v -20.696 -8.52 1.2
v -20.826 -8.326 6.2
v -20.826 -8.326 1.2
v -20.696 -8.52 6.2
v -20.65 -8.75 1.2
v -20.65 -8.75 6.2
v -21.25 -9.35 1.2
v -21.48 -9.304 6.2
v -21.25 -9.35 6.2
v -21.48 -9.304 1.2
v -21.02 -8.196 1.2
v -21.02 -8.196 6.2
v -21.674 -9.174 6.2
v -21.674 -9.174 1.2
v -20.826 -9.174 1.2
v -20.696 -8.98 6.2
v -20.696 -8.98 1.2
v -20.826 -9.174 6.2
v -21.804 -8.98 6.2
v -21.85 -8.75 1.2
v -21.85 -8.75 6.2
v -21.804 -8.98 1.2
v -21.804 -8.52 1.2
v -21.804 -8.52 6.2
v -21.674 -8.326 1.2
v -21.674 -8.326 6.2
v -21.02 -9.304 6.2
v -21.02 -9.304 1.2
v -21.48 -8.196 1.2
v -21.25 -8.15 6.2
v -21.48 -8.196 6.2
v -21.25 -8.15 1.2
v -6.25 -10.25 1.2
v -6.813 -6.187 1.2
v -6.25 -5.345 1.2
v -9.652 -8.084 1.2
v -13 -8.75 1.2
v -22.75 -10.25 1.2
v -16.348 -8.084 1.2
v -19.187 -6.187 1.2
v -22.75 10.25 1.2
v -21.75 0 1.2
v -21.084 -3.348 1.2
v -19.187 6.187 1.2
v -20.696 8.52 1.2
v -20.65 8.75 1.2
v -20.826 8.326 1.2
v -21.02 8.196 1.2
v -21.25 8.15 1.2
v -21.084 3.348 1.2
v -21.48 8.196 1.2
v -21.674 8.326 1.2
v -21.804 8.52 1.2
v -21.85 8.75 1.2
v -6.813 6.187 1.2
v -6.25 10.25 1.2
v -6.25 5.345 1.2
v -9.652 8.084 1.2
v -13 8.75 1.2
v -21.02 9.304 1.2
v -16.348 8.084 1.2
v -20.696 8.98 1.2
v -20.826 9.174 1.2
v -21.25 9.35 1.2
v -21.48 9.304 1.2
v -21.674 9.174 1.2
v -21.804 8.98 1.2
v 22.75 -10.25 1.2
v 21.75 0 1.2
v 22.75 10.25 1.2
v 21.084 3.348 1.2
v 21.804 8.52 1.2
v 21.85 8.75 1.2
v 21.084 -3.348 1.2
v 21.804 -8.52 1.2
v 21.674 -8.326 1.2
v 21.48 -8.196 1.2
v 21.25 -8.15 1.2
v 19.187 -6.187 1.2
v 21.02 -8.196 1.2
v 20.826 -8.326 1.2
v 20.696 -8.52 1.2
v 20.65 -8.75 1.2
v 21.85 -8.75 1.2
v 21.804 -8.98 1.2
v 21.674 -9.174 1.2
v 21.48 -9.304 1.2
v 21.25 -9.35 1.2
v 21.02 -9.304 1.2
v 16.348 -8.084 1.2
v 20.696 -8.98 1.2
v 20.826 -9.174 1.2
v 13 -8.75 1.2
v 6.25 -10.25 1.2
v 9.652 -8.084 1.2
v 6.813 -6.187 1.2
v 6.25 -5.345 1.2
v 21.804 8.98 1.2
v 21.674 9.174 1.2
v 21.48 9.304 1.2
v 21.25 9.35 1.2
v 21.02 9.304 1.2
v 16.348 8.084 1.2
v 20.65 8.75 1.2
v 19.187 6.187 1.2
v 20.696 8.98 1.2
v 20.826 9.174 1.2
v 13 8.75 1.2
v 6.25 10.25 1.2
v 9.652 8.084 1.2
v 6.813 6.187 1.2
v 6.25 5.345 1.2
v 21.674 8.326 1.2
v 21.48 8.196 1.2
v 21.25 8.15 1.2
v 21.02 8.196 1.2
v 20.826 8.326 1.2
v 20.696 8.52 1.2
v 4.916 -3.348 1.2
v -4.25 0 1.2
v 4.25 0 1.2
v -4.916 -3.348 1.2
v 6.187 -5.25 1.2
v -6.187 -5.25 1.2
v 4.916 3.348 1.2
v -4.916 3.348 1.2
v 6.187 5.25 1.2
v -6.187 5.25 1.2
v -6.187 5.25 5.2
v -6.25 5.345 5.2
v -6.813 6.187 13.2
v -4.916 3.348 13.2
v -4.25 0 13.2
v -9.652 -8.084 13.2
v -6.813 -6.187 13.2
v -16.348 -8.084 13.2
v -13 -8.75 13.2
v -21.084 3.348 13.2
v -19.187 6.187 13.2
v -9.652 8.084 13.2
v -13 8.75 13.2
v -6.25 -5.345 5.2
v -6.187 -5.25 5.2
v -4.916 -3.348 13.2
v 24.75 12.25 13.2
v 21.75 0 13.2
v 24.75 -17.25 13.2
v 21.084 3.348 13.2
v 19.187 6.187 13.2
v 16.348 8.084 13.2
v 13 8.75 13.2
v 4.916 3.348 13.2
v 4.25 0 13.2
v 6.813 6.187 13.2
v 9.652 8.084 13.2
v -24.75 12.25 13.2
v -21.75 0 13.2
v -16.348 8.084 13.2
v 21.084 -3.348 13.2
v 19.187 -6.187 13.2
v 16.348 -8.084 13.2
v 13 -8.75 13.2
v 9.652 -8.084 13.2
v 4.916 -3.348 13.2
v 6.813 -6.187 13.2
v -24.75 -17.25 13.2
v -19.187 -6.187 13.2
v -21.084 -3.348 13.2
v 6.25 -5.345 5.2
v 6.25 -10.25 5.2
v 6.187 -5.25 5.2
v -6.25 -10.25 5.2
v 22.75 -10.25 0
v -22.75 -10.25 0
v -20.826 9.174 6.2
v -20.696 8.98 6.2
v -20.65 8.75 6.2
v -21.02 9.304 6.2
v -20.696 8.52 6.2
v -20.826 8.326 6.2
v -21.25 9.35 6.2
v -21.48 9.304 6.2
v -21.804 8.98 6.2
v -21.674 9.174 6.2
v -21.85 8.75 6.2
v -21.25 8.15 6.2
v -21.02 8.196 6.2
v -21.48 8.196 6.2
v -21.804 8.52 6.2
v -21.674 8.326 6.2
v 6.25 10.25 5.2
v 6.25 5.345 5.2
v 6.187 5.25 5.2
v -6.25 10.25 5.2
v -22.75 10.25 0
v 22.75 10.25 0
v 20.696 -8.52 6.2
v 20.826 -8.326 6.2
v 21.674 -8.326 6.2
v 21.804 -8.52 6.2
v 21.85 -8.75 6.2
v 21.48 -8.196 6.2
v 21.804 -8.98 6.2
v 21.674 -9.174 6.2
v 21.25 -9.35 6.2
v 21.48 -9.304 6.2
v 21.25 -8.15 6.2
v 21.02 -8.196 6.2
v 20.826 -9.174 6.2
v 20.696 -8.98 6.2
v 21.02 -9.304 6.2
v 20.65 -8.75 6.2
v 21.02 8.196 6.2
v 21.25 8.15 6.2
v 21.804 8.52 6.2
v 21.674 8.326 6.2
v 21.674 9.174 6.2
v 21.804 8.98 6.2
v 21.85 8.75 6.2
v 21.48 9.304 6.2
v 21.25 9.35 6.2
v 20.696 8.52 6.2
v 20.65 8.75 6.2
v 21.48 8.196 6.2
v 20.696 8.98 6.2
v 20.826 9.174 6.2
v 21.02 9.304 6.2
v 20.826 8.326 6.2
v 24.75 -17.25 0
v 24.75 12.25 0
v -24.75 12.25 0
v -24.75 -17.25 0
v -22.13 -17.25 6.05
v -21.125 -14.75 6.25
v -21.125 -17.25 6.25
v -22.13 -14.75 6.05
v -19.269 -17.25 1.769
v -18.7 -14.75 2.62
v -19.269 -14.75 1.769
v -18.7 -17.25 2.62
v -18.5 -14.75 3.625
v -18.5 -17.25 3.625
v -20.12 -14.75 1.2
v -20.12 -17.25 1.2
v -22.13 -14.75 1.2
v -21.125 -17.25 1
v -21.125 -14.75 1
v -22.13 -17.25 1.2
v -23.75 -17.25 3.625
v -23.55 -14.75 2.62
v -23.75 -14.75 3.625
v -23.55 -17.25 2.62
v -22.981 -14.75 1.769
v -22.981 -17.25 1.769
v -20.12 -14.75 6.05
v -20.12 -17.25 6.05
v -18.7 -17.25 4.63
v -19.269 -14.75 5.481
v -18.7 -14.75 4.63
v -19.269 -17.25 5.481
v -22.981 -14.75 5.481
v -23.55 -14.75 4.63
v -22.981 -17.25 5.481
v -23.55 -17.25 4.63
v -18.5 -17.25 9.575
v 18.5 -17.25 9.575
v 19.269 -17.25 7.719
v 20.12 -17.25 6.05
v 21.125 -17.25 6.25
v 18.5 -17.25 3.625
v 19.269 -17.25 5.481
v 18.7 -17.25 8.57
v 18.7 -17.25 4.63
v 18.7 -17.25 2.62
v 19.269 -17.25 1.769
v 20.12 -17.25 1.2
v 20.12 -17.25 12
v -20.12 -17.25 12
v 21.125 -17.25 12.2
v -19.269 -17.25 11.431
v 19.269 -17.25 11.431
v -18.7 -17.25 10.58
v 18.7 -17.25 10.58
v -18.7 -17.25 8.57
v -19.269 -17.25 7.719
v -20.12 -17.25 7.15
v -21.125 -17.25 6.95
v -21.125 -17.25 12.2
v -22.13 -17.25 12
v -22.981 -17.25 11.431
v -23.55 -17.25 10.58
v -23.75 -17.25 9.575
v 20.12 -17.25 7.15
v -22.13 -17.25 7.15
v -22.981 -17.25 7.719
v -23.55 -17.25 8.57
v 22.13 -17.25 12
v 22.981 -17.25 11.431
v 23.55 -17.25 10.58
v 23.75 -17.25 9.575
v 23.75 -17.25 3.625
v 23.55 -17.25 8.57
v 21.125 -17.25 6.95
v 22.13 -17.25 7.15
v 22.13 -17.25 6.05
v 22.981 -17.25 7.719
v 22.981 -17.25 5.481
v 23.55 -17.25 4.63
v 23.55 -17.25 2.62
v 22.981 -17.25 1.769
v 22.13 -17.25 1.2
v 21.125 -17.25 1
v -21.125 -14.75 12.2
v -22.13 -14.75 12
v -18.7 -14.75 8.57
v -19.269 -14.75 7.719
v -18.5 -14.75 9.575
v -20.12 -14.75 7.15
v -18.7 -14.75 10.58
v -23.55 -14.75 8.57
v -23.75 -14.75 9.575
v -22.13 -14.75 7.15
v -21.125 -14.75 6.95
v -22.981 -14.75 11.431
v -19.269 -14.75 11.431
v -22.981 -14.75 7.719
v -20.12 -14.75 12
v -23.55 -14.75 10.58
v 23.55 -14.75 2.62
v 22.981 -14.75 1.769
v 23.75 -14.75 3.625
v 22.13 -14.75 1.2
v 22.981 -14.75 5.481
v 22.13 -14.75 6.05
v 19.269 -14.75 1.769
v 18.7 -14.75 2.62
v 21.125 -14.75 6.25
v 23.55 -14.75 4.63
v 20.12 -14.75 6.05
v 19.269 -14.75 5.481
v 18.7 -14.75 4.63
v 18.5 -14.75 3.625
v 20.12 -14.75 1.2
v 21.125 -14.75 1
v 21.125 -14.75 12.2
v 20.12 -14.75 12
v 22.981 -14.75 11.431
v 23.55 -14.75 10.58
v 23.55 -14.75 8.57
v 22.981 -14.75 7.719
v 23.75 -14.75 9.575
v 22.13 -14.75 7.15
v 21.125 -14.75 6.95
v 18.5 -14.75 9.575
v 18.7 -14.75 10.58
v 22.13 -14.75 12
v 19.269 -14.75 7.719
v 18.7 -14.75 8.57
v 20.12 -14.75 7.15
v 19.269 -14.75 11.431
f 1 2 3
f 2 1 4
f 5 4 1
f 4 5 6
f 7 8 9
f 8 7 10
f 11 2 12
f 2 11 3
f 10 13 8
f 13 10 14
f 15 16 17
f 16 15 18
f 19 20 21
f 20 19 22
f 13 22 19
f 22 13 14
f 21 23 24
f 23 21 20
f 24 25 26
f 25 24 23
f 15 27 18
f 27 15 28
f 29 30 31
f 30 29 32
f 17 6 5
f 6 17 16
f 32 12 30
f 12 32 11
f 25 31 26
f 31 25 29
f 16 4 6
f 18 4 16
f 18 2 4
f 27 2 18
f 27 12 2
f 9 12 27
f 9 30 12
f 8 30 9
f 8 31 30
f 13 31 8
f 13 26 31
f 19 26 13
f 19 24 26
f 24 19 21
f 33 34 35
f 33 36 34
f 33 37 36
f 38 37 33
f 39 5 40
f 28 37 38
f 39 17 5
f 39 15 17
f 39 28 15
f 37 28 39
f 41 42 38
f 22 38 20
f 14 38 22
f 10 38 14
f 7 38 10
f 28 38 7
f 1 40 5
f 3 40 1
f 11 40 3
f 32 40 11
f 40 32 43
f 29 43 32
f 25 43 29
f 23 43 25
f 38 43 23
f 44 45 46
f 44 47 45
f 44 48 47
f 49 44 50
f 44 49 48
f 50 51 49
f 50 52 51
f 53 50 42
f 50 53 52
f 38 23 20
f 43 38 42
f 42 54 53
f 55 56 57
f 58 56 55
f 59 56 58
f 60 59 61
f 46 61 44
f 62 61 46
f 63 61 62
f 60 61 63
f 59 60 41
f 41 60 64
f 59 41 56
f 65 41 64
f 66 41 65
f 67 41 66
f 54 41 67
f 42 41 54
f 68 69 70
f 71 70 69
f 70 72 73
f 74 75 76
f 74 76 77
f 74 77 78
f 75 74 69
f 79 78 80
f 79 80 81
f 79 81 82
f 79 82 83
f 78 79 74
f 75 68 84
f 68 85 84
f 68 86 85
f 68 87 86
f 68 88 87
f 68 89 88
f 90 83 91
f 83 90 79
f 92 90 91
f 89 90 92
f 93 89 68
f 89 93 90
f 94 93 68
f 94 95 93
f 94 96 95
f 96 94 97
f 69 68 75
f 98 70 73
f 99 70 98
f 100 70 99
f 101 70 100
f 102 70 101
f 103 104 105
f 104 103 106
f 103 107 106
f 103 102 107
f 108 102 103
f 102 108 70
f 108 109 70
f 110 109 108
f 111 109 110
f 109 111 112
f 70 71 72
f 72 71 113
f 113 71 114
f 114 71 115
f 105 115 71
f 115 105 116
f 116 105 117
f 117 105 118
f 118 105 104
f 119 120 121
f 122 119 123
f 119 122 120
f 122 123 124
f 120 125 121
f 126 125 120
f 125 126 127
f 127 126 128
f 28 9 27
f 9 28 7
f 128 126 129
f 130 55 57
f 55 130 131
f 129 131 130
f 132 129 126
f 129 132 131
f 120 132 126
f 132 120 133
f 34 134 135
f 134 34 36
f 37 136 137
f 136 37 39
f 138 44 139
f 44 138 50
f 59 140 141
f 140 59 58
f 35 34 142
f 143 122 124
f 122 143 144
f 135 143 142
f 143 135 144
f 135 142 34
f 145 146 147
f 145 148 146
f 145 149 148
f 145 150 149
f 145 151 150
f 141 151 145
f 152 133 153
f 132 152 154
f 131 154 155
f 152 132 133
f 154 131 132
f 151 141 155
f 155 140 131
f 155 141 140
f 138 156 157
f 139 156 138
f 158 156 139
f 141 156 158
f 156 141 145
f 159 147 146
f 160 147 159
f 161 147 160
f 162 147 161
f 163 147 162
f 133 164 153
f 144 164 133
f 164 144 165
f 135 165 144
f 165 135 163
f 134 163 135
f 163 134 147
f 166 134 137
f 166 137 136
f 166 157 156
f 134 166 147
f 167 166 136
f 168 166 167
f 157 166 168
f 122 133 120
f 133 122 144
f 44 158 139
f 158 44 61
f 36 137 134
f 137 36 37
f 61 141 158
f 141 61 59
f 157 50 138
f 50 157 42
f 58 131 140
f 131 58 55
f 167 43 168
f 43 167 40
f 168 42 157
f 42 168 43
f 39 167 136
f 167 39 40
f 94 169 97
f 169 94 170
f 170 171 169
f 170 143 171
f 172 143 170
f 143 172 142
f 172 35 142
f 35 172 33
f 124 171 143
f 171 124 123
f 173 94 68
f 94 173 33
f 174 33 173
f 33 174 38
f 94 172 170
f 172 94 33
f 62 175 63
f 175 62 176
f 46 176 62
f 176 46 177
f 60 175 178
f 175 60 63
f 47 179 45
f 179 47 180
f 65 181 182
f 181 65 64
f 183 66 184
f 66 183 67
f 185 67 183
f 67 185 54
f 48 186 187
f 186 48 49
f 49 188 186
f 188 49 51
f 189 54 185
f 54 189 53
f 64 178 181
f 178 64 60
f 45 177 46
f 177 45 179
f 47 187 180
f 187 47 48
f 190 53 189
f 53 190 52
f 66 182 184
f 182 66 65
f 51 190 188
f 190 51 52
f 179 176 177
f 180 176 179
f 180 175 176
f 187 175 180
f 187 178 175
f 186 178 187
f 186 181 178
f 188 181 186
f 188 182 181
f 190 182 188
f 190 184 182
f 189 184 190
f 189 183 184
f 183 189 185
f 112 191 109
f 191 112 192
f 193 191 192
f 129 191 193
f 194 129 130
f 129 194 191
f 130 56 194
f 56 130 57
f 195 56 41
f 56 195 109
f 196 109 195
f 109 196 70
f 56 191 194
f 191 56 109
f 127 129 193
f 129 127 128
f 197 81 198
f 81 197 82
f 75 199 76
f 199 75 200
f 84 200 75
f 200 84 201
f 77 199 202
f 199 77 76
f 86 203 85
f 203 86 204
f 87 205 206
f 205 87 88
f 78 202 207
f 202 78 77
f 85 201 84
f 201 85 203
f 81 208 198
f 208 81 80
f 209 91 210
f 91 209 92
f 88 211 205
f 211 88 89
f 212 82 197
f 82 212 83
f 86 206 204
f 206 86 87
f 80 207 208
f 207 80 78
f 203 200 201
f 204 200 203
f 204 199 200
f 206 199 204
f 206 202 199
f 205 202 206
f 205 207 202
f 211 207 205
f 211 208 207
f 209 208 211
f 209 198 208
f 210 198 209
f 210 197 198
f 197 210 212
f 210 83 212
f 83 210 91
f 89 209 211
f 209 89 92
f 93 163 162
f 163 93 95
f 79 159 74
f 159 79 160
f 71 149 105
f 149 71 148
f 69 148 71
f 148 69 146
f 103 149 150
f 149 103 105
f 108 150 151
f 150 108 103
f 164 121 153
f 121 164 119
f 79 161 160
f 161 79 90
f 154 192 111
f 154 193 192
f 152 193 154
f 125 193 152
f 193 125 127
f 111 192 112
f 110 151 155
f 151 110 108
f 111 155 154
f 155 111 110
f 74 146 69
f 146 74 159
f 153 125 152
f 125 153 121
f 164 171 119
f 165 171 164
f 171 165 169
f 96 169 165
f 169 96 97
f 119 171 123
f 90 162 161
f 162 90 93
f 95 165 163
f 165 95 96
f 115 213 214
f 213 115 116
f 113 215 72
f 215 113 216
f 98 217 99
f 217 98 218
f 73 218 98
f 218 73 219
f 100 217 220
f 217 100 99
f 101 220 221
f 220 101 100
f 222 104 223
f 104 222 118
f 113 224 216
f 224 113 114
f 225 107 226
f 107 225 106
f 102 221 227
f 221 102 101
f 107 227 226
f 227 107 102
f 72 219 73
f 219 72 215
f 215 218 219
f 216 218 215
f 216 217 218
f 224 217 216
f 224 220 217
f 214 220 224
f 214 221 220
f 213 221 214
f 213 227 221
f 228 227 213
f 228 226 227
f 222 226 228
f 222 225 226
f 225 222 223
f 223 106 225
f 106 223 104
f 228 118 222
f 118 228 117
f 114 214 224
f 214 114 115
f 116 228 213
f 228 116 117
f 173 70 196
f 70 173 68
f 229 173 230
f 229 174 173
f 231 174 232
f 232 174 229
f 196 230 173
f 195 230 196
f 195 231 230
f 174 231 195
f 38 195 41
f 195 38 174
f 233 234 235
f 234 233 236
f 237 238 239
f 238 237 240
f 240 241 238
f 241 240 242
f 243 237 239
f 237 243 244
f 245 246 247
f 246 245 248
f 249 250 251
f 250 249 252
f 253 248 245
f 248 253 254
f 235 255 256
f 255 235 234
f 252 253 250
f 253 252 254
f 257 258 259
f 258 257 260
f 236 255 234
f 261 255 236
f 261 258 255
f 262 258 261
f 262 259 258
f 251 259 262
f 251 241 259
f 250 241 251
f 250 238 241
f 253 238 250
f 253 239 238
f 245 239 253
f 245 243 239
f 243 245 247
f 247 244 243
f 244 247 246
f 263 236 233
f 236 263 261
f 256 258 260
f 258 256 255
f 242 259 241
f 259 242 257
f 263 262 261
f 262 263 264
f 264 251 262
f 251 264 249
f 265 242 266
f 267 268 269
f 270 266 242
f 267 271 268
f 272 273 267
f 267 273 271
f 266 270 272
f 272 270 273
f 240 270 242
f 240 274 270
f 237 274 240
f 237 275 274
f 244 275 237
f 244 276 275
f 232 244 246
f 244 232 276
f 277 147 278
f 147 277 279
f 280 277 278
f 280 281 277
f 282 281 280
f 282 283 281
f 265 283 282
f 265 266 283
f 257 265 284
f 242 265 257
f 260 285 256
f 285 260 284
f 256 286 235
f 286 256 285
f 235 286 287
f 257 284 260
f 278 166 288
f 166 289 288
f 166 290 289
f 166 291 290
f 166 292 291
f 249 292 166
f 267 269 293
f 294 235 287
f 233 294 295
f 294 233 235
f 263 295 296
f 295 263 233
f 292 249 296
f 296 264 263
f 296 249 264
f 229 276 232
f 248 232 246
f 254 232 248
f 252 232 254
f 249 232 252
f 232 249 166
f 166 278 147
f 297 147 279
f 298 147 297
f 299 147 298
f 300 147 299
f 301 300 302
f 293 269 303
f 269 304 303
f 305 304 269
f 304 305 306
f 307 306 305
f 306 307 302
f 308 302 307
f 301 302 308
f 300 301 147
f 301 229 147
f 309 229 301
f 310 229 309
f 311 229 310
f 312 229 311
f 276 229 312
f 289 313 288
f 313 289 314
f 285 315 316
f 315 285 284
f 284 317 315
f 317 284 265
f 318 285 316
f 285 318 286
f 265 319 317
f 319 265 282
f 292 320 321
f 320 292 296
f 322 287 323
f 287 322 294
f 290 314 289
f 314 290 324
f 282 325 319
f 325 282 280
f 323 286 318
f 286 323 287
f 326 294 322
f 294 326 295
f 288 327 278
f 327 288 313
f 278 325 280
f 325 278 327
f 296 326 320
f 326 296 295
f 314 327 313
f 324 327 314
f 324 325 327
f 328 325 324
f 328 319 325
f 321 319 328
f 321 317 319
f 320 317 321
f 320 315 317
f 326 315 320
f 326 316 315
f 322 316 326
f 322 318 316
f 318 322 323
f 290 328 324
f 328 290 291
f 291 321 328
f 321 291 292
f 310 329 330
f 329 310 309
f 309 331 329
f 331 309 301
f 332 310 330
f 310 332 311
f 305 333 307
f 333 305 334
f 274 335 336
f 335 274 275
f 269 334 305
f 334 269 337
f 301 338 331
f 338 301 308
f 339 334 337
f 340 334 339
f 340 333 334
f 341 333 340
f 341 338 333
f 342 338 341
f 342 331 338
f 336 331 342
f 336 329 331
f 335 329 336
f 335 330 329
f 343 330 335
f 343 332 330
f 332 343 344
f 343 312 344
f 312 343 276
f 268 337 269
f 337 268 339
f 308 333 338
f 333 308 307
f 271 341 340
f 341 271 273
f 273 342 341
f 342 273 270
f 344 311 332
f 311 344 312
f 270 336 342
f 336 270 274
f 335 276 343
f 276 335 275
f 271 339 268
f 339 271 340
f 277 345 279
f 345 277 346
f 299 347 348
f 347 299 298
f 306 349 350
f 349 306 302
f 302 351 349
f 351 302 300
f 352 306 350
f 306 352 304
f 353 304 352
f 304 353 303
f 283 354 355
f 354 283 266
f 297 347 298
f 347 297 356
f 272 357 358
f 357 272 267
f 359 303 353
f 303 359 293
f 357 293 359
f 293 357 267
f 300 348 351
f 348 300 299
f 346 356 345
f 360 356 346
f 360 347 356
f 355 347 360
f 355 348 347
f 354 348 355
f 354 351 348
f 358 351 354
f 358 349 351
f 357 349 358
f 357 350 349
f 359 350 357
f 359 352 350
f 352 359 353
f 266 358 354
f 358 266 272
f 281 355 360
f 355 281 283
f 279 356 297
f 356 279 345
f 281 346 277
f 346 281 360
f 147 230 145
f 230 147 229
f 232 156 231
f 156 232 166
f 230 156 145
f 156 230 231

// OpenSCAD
// base with magnets for a HC-SR04 sensor
$fn = 16;
pcb = [45.5, 20.5, 1.2];   // pcb dimensions
pcb_h = [42.5, 17.5, 1.5]; // pcb hole dx, dy, diameter
pcb_mh = [5, 1.2];         // case mounting hole: depth, diameter (~1.5mm thread)
sensor = [12, 17.5, 26];   // sensor: height, diameter (+1.5mm wiggle), distance
crystal = [12.5, 5, 4];
magnet = [5.25, 2.5];
bottom = 5;
wall = 2;

module base(){
    translate([-(pcb.x/2 + wall), -(pcb.y/2 + bottom + wall), 0]) cube(pcb + [2*wall, 2*wall, 0] + [0, bottom, sensor.x]);
}

module pcb(){
    union(){
        translate([-pcb.x/2, -pcb.y/2, 0]) cube(pcb);

        for (dx=[-1,1], dy=[-1, 1]){
            translate([pcb_h.x/2*dx, pcb_h.y/2*dy, pcb.z]) cylinder(d=pcb_mh.y, h=pcb_mh.x);
            translate([sensor.z/2*dx, 0, pcb.z]) cylinder(d=sensor.y, h=sensor.x);
            translate([-crystal.x/2, -crystal.y/2 + (pcb.y/2-crystal.y/2)*dy, pcb.z]) cube(crystal);
        }
    }
}

module magnets(){
    for (dx=[-1, 1], dz=[-1, 1]){
        translate([(pcb.x/2 + wall/2 - magnet.x/2)*dx, -(pcb.y/2+bottom+wall), (pcb.z/2+sensor.x/2)+(pcb.z/2+sensor.x/2-wall/2-magnet.x/2)*dz]) rotate([-90, 0, 0]) cylinder(d=magnet.x, h=magnet.y);
    }
}

module all(){
    difference(){
        base();
        pcb();
        magnets();
    }
}

all();
